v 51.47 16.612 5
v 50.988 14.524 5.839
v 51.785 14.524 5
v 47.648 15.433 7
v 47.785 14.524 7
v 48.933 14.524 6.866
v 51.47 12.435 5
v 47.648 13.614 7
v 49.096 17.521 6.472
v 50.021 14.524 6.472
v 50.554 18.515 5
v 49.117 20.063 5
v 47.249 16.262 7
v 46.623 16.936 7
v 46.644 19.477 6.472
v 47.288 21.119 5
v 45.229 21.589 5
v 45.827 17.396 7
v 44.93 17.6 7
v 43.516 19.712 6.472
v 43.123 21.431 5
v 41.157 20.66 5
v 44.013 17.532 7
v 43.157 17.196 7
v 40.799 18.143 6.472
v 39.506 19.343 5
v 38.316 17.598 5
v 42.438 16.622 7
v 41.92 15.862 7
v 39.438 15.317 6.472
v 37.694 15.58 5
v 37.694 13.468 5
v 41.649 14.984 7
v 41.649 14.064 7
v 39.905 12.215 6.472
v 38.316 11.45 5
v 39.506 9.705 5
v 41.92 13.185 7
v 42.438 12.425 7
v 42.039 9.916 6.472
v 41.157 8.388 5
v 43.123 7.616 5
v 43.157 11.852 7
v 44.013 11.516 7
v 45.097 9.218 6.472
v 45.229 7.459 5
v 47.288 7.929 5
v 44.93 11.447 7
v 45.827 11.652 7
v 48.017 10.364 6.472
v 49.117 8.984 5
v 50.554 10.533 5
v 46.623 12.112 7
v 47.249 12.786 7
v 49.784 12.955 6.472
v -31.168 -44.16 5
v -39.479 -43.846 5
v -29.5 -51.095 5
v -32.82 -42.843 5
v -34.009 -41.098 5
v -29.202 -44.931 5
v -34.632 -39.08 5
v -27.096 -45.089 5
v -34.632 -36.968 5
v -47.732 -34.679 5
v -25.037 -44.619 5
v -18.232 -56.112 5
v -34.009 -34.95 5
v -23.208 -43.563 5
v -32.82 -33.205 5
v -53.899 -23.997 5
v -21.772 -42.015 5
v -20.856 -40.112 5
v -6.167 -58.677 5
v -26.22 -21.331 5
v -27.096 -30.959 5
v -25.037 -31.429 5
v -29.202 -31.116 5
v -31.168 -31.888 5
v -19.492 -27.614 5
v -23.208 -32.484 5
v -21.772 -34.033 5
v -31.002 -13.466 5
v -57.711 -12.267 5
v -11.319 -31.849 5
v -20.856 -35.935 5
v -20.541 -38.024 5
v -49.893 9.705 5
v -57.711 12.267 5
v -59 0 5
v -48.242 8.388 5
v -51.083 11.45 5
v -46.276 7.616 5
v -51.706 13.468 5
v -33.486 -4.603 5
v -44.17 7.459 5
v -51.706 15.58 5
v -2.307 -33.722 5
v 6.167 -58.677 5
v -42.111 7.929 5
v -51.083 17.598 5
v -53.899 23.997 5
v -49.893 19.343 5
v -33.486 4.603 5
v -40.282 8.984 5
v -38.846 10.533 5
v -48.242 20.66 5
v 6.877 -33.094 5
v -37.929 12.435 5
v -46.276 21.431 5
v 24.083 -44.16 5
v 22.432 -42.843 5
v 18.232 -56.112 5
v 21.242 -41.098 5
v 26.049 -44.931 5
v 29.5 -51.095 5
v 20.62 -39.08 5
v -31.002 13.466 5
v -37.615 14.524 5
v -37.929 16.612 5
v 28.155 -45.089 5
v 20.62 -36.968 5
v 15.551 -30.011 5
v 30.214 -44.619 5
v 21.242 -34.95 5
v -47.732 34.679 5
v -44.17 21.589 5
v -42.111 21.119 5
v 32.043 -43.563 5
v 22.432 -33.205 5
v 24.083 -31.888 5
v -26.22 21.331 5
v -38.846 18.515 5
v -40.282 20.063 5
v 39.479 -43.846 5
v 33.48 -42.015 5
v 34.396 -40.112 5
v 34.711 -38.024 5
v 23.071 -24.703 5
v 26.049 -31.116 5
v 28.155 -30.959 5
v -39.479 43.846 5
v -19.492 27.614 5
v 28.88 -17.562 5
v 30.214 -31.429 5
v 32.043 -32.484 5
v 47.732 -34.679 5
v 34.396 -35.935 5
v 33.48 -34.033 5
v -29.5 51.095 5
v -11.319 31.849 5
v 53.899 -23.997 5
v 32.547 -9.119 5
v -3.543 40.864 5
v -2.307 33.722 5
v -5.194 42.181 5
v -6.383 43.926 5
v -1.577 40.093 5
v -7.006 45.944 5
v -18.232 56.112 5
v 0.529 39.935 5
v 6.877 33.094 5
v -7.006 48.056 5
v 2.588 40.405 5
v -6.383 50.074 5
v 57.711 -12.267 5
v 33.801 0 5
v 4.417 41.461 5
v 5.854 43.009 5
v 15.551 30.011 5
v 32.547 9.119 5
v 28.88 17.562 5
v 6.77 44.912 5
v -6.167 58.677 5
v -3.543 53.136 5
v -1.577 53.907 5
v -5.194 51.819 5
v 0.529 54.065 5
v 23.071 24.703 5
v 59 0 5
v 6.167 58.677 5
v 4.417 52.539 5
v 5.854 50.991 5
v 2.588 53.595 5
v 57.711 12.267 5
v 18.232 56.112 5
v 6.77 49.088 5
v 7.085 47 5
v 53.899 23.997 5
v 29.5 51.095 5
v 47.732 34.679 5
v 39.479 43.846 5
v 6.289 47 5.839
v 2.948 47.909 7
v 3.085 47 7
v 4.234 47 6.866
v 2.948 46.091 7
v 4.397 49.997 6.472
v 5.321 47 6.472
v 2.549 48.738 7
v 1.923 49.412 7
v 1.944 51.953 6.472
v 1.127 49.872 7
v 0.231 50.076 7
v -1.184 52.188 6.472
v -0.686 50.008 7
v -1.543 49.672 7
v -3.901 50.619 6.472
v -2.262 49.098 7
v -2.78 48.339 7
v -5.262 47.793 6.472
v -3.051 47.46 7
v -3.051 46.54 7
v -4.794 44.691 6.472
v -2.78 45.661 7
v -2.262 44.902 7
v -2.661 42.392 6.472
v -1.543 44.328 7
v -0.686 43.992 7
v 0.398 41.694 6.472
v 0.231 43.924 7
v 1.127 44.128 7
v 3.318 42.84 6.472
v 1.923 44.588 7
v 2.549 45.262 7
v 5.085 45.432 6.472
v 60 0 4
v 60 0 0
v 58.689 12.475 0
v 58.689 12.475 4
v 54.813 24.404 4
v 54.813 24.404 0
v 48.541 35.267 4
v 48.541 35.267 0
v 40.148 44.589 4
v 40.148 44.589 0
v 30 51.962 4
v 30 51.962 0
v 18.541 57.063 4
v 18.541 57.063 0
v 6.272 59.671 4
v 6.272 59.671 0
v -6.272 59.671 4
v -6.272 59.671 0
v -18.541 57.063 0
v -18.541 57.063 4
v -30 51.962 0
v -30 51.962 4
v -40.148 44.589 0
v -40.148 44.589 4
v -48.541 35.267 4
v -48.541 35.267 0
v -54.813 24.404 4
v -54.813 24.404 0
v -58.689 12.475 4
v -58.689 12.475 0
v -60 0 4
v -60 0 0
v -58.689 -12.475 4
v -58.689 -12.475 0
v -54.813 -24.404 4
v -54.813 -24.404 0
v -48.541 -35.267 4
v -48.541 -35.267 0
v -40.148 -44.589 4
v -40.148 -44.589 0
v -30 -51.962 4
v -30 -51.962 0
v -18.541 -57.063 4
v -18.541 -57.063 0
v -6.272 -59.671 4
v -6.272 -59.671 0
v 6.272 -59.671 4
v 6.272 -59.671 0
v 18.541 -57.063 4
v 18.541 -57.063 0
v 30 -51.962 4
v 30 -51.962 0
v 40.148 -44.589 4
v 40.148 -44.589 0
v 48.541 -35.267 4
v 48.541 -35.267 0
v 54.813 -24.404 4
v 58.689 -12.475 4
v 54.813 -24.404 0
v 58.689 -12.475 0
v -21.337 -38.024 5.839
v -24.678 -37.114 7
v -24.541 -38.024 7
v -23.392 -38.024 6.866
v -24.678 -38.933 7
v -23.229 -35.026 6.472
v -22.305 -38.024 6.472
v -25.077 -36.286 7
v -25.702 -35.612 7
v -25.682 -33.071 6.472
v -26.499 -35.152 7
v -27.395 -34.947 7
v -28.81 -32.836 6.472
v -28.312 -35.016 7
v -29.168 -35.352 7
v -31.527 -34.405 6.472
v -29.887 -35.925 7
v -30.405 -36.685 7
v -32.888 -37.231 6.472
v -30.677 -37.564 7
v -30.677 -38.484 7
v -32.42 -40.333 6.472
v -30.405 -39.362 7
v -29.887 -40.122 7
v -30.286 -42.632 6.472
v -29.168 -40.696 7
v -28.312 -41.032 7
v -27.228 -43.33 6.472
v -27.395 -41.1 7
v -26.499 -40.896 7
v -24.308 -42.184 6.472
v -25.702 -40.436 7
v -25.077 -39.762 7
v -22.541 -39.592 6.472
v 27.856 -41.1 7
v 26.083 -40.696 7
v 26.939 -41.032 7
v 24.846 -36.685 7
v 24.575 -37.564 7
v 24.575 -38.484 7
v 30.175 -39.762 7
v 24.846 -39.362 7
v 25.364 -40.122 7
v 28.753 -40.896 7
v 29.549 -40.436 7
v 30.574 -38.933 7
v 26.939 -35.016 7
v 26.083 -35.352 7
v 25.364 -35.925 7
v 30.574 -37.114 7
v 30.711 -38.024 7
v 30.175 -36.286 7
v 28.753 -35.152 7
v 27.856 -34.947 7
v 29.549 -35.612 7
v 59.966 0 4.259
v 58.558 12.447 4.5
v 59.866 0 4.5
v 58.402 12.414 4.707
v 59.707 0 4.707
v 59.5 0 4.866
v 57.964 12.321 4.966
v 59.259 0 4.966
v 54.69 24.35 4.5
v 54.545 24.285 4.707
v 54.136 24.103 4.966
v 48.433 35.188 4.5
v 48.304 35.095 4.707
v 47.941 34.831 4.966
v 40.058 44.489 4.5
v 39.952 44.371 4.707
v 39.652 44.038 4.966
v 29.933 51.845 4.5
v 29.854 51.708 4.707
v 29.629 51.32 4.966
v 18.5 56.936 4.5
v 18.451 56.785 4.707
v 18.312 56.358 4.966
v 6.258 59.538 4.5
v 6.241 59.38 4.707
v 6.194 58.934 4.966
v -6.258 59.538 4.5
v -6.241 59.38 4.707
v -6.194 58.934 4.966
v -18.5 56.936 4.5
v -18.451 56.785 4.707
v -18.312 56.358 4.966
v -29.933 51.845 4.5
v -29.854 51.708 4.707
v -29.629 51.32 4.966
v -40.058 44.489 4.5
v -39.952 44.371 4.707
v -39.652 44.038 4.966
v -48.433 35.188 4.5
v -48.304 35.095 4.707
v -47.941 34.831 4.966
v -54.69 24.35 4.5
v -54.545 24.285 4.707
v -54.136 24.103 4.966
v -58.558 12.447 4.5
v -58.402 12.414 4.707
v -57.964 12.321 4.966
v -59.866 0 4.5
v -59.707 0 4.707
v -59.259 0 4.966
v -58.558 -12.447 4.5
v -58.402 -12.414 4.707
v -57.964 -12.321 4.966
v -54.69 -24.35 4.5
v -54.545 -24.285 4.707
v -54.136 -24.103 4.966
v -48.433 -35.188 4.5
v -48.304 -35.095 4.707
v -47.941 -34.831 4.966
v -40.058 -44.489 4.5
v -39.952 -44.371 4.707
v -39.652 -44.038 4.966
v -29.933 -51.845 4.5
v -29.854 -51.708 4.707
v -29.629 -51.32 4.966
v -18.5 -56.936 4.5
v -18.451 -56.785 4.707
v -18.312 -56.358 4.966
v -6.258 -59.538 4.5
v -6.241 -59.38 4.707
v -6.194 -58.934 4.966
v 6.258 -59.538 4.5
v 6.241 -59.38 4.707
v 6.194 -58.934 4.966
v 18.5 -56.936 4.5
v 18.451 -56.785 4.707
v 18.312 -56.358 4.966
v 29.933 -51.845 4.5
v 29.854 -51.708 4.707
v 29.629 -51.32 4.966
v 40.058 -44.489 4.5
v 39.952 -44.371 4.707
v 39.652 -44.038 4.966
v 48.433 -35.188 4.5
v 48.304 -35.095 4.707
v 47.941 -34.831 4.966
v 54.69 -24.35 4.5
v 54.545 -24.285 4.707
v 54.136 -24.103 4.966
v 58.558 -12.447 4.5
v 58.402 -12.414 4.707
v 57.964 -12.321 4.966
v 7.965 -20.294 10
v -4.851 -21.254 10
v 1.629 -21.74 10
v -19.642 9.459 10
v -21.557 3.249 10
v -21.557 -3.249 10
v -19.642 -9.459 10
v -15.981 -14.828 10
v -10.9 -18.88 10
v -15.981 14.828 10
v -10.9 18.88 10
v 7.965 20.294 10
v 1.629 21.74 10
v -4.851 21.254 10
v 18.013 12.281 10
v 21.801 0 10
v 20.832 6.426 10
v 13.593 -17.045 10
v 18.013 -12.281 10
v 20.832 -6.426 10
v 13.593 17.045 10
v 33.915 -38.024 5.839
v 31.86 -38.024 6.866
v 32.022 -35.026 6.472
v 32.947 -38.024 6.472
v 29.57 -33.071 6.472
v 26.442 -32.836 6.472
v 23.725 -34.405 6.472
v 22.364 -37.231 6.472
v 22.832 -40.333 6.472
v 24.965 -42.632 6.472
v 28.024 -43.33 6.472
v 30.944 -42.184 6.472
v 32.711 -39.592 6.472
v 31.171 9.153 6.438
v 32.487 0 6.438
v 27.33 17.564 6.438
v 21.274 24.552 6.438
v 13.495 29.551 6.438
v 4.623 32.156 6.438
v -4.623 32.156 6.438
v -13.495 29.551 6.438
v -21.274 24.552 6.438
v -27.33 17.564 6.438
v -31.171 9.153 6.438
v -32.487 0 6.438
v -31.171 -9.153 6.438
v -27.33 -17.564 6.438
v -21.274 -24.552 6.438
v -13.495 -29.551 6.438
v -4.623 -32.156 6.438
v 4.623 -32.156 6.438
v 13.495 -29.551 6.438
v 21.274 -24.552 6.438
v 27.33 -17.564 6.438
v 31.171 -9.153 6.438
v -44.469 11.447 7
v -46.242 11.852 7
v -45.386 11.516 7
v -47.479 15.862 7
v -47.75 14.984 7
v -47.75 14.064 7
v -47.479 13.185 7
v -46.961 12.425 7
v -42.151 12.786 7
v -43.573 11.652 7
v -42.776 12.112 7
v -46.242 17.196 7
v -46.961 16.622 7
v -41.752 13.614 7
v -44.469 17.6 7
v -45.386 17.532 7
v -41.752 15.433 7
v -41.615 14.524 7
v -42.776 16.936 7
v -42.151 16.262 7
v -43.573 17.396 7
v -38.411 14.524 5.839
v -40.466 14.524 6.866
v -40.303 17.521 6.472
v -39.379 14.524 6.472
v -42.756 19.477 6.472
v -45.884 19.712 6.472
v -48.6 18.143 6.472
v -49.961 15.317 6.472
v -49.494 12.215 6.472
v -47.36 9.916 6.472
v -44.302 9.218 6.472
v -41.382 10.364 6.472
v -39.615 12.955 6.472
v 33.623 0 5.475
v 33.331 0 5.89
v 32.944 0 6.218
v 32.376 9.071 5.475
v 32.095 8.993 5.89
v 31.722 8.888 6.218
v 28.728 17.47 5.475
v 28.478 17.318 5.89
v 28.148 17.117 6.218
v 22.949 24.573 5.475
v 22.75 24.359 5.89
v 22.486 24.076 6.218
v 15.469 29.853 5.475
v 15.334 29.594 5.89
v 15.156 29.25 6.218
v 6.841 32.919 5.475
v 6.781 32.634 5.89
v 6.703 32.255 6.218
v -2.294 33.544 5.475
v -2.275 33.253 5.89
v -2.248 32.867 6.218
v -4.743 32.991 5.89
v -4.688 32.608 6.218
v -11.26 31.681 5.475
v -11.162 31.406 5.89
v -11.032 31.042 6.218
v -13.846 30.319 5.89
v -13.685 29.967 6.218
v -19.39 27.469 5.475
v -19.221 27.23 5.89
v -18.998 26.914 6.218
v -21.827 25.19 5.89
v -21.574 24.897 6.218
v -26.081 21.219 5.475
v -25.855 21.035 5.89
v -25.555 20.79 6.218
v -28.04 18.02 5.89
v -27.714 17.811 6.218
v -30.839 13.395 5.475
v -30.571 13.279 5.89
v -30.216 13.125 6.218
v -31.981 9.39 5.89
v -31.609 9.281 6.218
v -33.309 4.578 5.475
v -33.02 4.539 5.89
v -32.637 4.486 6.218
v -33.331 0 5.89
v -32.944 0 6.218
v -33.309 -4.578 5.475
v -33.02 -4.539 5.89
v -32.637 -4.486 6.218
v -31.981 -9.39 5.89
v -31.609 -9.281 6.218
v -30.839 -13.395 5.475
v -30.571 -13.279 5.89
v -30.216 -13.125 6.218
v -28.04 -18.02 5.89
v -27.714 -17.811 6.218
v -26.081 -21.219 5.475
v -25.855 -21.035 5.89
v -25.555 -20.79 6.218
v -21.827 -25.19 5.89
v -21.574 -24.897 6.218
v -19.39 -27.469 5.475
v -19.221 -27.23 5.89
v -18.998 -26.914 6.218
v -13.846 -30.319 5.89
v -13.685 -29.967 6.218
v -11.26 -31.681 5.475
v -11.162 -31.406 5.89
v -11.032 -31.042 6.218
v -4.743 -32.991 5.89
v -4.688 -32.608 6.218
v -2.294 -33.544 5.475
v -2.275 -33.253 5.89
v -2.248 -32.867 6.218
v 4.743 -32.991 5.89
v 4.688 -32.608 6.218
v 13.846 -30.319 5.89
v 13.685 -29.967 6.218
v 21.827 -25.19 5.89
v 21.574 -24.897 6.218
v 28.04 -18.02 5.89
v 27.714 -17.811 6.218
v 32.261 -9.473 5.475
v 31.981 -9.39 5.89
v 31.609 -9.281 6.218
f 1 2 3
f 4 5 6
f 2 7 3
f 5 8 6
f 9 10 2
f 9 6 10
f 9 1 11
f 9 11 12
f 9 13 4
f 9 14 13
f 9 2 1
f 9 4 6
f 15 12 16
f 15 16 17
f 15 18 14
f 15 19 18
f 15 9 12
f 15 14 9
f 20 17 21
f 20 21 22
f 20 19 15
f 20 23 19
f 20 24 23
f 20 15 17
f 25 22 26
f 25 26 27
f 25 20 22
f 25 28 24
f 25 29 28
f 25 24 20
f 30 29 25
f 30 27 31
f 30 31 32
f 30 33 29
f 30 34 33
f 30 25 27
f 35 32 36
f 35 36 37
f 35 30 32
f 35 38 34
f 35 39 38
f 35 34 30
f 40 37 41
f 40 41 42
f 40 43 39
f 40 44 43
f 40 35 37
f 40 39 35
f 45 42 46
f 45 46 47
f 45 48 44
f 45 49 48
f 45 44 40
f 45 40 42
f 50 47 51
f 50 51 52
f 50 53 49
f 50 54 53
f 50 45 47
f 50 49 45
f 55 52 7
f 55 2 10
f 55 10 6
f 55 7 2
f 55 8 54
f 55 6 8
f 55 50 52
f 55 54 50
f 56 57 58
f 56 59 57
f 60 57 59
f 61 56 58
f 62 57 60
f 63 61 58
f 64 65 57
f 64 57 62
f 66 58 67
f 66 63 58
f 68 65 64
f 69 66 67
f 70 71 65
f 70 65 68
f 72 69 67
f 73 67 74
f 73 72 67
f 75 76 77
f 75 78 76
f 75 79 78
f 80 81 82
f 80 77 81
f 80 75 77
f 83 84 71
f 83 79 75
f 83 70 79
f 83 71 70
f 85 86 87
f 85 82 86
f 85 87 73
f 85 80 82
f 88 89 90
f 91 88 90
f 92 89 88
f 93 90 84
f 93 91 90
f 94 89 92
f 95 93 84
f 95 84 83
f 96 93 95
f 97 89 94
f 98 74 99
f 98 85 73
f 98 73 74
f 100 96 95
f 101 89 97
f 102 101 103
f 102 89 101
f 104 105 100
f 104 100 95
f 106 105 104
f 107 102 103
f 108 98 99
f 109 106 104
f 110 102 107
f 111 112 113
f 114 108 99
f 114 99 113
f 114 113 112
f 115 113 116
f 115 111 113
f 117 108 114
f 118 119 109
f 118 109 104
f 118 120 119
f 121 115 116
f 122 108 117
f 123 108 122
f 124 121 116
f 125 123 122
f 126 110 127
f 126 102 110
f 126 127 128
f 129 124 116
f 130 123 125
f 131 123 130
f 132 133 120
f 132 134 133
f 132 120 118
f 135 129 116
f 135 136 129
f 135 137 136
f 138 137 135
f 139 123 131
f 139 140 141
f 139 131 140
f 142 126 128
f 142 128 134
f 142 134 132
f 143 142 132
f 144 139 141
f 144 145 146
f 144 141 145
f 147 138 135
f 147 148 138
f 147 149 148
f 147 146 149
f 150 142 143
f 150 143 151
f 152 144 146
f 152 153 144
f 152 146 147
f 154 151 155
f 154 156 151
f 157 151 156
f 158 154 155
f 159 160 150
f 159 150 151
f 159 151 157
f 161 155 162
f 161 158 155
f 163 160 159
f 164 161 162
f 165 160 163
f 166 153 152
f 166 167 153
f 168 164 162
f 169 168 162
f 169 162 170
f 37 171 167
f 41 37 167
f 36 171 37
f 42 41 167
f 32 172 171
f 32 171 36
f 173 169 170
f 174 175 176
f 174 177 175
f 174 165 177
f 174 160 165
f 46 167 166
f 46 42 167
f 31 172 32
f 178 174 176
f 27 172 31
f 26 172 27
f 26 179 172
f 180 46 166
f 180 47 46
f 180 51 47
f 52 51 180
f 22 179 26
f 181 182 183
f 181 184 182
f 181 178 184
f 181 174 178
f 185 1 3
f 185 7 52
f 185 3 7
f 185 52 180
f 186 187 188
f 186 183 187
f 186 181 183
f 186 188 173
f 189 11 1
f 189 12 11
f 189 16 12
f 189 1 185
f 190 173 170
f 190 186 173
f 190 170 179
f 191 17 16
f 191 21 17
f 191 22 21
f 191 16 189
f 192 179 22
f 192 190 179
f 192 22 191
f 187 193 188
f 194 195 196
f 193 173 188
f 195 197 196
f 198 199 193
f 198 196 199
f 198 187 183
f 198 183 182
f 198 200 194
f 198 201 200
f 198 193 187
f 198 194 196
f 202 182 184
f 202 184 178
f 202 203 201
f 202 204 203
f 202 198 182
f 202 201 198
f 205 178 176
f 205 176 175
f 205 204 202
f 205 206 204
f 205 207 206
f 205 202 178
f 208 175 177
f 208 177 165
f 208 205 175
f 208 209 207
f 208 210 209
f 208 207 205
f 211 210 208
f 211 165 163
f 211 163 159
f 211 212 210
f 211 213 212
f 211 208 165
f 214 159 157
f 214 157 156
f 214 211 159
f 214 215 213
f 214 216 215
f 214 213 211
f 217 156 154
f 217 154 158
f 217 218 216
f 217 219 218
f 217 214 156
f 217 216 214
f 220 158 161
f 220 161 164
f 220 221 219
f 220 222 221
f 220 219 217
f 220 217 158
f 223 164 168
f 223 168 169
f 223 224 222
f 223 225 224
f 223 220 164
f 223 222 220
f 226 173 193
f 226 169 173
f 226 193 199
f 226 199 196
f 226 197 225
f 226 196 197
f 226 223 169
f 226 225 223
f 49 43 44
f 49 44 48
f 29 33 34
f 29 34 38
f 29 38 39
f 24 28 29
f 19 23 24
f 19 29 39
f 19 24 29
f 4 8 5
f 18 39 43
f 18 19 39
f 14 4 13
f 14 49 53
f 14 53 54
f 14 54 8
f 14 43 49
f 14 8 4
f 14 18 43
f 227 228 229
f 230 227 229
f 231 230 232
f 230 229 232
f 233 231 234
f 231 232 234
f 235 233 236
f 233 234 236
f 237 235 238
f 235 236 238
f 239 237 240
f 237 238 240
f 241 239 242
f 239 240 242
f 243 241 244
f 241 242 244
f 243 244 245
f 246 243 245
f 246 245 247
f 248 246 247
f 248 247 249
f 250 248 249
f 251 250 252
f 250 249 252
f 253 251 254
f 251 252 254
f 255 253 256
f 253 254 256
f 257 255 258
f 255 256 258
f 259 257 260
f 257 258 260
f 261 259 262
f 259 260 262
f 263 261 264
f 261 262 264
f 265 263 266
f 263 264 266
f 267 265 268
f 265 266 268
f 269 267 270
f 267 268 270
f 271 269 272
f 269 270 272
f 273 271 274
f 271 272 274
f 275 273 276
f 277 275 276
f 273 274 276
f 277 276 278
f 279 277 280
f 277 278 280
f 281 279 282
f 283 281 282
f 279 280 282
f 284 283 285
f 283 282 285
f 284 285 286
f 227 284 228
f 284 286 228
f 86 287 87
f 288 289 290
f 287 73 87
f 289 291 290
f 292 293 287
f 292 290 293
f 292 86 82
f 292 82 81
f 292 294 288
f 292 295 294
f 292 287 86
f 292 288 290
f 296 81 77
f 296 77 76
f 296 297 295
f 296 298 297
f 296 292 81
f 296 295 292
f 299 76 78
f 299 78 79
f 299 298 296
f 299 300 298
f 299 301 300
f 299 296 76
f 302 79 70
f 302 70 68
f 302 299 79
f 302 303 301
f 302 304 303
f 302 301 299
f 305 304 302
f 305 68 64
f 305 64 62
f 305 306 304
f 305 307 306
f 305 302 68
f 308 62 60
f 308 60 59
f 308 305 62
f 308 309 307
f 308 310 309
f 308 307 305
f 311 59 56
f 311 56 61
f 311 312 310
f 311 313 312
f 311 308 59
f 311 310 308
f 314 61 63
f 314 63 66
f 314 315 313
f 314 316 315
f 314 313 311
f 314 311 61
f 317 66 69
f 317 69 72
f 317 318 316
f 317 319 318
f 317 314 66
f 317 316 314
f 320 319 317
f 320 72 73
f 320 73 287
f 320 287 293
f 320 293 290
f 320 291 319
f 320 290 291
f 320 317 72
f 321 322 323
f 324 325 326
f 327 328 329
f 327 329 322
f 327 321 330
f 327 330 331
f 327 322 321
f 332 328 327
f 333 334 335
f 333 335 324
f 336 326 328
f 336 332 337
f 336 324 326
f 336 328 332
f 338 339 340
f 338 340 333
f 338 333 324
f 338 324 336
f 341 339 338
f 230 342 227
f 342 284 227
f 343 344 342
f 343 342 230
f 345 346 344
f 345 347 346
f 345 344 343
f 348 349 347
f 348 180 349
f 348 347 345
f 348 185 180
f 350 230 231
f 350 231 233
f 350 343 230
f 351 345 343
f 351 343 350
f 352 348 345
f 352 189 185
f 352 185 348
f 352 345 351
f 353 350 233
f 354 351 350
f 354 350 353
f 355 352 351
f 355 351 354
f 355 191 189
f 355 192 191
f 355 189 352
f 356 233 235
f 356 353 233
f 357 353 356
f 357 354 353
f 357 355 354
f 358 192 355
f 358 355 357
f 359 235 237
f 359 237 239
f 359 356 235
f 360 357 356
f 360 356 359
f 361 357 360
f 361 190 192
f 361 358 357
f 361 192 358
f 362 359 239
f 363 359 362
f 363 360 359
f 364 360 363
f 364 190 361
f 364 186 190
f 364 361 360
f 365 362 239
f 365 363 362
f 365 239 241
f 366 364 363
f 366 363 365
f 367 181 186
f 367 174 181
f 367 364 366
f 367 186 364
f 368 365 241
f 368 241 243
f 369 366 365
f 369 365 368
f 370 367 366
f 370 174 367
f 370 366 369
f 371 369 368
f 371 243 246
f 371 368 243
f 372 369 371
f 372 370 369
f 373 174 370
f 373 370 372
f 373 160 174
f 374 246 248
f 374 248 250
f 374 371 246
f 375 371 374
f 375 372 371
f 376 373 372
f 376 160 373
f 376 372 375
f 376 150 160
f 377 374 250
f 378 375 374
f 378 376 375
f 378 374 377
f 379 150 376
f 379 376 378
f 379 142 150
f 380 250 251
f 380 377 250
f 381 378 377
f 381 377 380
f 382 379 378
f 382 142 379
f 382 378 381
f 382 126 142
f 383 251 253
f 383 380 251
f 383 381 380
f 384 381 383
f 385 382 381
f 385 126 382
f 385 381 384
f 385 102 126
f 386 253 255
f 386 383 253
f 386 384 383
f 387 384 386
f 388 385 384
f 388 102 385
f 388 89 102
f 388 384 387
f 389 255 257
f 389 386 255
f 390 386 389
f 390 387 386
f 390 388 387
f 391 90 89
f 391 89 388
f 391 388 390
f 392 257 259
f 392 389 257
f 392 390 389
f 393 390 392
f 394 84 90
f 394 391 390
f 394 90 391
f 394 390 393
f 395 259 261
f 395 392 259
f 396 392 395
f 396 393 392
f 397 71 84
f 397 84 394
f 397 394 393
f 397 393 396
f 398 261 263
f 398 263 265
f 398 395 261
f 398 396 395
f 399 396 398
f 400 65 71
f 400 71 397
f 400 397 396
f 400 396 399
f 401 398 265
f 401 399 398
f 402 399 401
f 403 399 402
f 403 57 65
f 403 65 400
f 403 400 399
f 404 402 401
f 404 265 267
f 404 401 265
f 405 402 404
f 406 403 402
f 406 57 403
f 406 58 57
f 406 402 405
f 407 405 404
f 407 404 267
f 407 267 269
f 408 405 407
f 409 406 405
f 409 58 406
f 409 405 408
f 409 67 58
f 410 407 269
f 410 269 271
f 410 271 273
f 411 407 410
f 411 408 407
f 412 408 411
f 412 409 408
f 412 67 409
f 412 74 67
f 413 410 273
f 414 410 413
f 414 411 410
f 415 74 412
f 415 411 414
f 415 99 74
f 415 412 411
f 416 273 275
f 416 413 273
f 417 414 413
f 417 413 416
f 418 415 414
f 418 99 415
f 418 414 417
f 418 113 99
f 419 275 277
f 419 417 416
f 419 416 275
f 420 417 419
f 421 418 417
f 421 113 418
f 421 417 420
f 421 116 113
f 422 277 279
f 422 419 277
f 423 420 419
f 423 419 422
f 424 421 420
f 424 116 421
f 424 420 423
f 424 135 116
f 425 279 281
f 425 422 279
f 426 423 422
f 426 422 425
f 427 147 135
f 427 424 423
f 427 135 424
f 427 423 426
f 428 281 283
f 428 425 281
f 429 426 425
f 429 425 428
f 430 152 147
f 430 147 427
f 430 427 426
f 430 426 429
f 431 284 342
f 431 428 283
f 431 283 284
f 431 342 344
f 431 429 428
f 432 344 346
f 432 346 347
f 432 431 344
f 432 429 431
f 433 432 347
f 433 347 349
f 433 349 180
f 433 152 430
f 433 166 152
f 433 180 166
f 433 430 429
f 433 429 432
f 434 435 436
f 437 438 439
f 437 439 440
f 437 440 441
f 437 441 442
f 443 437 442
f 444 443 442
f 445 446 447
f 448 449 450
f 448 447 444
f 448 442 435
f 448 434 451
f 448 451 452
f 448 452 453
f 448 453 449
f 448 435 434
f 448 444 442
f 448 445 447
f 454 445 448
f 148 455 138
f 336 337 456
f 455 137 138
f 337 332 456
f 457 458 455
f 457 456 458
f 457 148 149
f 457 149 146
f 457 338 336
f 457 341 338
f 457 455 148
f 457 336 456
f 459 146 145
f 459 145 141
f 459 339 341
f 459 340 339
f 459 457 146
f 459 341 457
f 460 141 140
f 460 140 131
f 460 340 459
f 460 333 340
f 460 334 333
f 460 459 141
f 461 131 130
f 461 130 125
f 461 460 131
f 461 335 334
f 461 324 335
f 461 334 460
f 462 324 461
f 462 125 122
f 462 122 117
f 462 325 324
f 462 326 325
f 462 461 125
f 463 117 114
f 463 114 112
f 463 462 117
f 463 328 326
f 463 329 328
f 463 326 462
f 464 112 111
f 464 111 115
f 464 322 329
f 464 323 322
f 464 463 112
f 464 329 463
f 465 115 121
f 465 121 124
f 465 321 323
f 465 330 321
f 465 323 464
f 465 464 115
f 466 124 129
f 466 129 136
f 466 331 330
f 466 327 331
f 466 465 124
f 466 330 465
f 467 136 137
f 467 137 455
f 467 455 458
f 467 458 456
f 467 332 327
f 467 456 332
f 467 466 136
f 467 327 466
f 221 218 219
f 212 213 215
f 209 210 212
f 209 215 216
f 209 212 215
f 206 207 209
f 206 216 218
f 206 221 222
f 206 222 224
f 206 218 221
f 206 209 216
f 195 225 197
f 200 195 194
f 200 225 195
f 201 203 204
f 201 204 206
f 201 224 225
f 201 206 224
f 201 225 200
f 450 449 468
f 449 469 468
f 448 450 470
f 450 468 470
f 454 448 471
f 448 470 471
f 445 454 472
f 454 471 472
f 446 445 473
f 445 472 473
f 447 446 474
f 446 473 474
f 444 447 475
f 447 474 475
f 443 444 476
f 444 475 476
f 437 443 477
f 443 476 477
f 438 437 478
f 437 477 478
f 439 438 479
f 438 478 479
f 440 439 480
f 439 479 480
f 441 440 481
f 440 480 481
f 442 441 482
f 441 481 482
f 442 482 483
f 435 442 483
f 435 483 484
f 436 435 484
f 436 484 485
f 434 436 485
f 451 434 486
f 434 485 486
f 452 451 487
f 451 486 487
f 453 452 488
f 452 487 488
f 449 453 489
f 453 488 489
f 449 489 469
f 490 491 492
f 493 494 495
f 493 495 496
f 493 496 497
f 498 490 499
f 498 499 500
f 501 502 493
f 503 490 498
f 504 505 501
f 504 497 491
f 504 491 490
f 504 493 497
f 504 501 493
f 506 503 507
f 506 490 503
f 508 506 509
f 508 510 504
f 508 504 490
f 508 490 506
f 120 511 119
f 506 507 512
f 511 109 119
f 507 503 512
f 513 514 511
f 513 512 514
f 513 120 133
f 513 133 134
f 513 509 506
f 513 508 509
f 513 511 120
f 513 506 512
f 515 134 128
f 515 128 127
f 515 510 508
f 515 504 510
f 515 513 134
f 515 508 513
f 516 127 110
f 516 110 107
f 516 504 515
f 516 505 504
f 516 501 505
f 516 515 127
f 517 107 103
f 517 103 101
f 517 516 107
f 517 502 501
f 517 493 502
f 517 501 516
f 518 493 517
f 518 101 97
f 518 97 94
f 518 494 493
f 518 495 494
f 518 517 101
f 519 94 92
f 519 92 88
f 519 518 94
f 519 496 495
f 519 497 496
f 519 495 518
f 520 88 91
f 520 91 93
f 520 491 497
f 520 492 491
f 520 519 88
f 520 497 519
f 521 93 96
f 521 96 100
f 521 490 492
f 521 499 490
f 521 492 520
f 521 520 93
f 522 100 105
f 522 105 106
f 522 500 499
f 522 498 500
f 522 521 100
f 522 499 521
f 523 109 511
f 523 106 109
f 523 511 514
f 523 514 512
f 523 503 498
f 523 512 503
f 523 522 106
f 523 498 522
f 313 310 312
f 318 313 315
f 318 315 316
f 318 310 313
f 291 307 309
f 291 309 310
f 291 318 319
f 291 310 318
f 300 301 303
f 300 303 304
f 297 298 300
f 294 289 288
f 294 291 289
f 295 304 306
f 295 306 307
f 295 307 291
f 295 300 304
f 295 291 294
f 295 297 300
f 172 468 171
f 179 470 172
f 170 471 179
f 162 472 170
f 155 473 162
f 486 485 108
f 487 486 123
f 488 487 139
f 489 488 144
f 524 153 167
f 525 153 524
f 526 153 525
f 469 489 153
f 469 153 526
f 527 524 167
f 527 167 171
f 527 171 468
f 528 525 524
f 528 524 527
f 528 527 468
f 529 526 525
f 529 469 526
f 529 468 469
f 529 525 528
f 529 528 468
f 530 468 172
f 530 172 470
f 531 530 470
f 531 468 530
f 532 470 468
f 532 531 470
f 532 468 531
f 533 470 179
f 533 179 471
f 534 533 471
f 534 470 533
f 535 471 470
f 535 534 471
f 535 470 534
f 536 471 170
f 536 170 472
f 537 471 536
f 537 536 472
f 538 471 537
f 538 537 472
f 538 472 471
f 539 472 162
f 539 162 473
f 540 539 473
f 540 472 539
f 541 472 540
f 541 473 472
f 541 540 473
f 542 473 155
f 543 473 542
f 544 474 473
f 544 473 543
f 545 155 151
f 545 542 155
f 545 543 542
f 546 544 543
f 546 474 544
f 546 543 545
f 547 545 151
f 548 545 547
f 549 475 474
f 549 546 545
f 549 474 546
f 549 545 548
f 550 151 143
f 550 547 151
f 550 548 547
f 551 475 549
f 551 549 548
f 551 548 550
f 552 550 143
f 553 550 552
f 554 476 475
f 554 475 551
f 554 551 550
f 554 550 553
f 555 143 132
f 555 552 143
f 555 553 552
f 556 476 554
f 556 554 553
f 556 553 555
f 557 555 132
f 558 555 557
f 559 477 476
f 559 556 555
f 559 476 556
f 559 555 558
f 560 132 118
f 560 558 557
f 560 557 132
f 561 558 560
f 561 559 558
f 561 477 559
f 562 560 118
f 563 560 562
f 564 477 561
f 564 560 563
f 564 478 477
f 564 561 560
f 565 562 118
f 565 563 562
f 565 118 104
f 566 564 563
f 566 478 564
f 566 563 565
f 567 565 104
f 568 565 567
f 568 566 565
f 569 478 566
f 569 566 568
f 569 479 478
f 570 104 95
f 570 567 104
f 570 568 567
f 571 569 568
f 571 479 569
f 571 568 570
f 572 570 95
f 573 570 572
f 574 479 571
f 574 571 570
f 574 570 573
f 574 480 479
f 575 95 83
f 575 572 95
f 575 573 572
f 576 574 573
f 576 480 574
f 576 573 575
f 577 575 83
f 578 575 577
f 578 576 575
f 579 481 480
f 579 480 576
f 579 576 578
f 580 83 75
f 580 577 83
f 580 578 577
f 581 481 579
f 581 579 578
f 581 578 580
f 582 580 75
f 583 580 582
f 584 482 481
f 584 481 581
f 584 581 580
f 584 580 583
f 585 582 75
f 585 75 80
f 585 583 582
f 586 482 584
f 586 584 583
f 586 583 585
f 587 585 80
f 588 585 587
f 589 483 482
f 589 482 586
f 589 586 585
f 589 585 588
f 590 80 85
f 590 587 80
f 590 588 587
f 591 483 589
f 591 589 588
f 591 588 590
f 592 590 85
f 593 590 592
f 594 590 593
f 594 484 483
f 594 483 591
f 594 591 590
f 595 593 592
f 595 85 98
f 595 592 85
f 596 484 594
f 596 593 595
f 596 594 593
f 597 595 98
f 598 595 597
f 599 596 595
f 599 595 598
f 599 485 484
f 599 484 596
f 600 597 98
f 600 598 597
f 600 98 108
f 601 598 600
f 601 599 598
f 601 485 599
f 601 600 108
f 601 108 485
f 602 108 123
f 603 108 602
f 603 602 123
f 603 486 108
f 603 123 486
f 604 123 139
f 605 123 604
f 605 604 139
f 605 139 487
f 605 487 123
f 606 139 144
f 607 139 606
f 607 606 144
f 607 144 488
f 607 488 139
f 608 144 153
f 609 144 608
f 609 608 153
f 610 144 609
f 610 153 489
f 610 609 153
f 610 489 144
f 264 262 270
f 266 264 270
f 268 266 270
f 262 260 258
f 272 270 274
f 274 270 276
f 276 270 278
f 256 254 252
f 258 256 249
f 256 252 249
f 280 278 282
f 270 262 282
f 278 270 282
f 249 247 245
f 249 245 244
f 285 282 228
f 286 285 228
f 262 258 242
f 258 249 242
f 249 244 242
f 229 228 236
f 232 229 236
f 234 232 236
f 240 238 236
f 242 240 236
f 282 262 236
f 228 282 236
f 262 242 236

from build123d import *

# Parameters (mm, degrees)
F0_R     = 60
F1_DEPTH = 5
F2_R     = 1
F3_R     = 7.0850530083
F4_DEPTH = 2
F6_R     = 33.800823702
F7_DEPTH = 5
F8_SIZE2 = 4
F8_SIZE  = 12


# Not quite as in the source:
# - a fillet or chamfer that OpenCascade refuses, or shapes differently, is made with other operations: its cross-section is extruded or revolved along the edge and cut away or added
# - a feature names something its author has since deleted; it is built from what else it names


with BuildPart() as f1:
    # F0 (on Top) → F1 (new body)
    with BuildSketch(Plane.XY):
        Circle(F0_R)
    extrude(amount=F1_DEPTH)

    # F2
    f2_edges = [f1.edges().sort_by_distance(p)[0] for p in [
        (-60, 0, 5),
    ]]
    fillet(f2_edges, radius=F2_R)

    # F3 (on face) → F4 (join)
    with BuildSketch(Plane.XY.offset(5)):
        with Locations((0, 47)):
            Circle(F3_R)
        with Locations((-44.6996562659, 14.5237987356)):
            Circle(F3_R)
        with Locations((-27.6259068577, -38.0237987356)):
            Circle(F3_R)
        with Locations((27.6259068577, -38.0237987356)):
            Circle(F3_R)
        with Locations((44.6996562659, 14.5237987356)):
            Circle(F3_R)
    extrude(amount=F4_DEPTH)

    # F5: fillet of radius 5 on 5 edges, made by hand

    # F5_s1 → F5_t2 (revolve, cut)
    with BuildSketch(Plane.XZ.offset(-47)):
        with BuildLine():
            ThreePointArc((7.0850530083, 5), (5.3211209858, 6.472135955), (3.0850530083, 7))
            Line((3.0850530083, 7), (7.0850530083, 7))
            Line((7.0850530083, 7), (7.0850530083, 5))
        make_face()
    revolve(axis=Axis((0, 47, 7), (0, 0, 1)), mode=Mode.SUBTRACT)

    # F5_s3 → F5_t4 (revolve, cut)
    with BuildSketch(Plane.XZ.offset(-14.5237987356)):
        with BuildLine():
            ThreePointArc((51.7847092742, 5), (50.0207772517, 6.472135955), (47.7847092742, 7))
            Line((47.7847092742, 7), (51.7847092742, 7))
            Line((51.7847092742, 7), (51.7847092742, 5))
        make_face()
    revolve(axis=Axis((44.6996562659, 14.5237987356, 7), (0, 0, 1)), mode=Mode.SUBTRACT)

    # F5_s5 → F5_t6 (revolve, cut)
    with BuildSketch(Plane.XZ.offset(38.0237987356)):
        with BuildLine():
            ThreePointArc((34.7109598661, 5), (32.9470278436, 6.472135955), (30.7109598661, 7))
            Line((30.7109598661, 7), (34.7109598661, 7))
            Line((34.7109598661, 7), (34.7109598661, 5))
        make_face()
    revolve(axis=Axis((27.6259068577, -38.0237987356, 7), (0, 0, 1)), mode=Mode.SUBTRACT)

    # F5_s7 → F5_t8 (revolve, cut)
    with BuildSketch(Plane.XZ.offset(38.0237987356)):
        with BuildLine():
            ThreePointArc((-20.5408538494, 5), (-22.3047858719, 6.472135955), (-24.5408538494, 7))
            Line((-24.5408538494, 7), (-20.5408538494, 7))
            Line((-20.5408538494, 7), (-20.5408538494, 5))
        make_face()
    revolve(axis=Axis((-27.6259068577, -38.0237987356, 7), (0, 0, 1)), mode=Mode.SUBTRACT)

    # F5_s9 → F5_t10 (revolve, cut)
    with BuildSketch(Plane.XZ.offset(-14.5237987356)):
        with BuildLine():
            ThreePointArc((-37.6146032575, 5), (-39.37853528, 6.472135955), (-41.6146032575, 7))
            Line((-41.6146032575, 7), (-37.6146032575, 7))
            Line((-37.6146032575, 7), (-37.6146032575, 5))
        make_face()
    revolve(axis=Axis((-44.6996562659, 14.5237987356, 7), (0, 0, 1)), mode=Mode.SUBTRACT)

    # F6 (on face) → F7 (join)
    with BuildSketch(Plane.XY.offset(5)):
        Circle(F6_R)
    extrude(amount=F7_DEPTH)

    # F8
    f8_edges = [f1.edges().sort_by_distance(p)[0] for p in [
        (-33.800824, 0, 10),
    ]]
    f8_side = f1.faces().sort_by_distance((0, 0, 10))[0]
    chamfer(f8_edges, length=F8_SIZE, length2=F8_SIZE2, reference=f8_side)

    # F9: fillet of radius 2 on 1 edges, made by hand

    # F9_s1 → F9_t2 (revolve, cut)
    with BuildSketch(Plane.XZ):
        with BuildLine():
            ThreePointArc((33.800823702, 5), (33.33069476, 5.8898153625), (32.486741959, 6.4380272477))
            Line((32.486741959, 6.4380272477), (33.800823702, 6))
            Line((33.800823702, 6), (33.800823702, 5))
        make_face()
    revolve(axis=Axis((0, 0, 6), (0, 0, 1)), mode=Mode.SUBTRACT)


solid = f1.part
